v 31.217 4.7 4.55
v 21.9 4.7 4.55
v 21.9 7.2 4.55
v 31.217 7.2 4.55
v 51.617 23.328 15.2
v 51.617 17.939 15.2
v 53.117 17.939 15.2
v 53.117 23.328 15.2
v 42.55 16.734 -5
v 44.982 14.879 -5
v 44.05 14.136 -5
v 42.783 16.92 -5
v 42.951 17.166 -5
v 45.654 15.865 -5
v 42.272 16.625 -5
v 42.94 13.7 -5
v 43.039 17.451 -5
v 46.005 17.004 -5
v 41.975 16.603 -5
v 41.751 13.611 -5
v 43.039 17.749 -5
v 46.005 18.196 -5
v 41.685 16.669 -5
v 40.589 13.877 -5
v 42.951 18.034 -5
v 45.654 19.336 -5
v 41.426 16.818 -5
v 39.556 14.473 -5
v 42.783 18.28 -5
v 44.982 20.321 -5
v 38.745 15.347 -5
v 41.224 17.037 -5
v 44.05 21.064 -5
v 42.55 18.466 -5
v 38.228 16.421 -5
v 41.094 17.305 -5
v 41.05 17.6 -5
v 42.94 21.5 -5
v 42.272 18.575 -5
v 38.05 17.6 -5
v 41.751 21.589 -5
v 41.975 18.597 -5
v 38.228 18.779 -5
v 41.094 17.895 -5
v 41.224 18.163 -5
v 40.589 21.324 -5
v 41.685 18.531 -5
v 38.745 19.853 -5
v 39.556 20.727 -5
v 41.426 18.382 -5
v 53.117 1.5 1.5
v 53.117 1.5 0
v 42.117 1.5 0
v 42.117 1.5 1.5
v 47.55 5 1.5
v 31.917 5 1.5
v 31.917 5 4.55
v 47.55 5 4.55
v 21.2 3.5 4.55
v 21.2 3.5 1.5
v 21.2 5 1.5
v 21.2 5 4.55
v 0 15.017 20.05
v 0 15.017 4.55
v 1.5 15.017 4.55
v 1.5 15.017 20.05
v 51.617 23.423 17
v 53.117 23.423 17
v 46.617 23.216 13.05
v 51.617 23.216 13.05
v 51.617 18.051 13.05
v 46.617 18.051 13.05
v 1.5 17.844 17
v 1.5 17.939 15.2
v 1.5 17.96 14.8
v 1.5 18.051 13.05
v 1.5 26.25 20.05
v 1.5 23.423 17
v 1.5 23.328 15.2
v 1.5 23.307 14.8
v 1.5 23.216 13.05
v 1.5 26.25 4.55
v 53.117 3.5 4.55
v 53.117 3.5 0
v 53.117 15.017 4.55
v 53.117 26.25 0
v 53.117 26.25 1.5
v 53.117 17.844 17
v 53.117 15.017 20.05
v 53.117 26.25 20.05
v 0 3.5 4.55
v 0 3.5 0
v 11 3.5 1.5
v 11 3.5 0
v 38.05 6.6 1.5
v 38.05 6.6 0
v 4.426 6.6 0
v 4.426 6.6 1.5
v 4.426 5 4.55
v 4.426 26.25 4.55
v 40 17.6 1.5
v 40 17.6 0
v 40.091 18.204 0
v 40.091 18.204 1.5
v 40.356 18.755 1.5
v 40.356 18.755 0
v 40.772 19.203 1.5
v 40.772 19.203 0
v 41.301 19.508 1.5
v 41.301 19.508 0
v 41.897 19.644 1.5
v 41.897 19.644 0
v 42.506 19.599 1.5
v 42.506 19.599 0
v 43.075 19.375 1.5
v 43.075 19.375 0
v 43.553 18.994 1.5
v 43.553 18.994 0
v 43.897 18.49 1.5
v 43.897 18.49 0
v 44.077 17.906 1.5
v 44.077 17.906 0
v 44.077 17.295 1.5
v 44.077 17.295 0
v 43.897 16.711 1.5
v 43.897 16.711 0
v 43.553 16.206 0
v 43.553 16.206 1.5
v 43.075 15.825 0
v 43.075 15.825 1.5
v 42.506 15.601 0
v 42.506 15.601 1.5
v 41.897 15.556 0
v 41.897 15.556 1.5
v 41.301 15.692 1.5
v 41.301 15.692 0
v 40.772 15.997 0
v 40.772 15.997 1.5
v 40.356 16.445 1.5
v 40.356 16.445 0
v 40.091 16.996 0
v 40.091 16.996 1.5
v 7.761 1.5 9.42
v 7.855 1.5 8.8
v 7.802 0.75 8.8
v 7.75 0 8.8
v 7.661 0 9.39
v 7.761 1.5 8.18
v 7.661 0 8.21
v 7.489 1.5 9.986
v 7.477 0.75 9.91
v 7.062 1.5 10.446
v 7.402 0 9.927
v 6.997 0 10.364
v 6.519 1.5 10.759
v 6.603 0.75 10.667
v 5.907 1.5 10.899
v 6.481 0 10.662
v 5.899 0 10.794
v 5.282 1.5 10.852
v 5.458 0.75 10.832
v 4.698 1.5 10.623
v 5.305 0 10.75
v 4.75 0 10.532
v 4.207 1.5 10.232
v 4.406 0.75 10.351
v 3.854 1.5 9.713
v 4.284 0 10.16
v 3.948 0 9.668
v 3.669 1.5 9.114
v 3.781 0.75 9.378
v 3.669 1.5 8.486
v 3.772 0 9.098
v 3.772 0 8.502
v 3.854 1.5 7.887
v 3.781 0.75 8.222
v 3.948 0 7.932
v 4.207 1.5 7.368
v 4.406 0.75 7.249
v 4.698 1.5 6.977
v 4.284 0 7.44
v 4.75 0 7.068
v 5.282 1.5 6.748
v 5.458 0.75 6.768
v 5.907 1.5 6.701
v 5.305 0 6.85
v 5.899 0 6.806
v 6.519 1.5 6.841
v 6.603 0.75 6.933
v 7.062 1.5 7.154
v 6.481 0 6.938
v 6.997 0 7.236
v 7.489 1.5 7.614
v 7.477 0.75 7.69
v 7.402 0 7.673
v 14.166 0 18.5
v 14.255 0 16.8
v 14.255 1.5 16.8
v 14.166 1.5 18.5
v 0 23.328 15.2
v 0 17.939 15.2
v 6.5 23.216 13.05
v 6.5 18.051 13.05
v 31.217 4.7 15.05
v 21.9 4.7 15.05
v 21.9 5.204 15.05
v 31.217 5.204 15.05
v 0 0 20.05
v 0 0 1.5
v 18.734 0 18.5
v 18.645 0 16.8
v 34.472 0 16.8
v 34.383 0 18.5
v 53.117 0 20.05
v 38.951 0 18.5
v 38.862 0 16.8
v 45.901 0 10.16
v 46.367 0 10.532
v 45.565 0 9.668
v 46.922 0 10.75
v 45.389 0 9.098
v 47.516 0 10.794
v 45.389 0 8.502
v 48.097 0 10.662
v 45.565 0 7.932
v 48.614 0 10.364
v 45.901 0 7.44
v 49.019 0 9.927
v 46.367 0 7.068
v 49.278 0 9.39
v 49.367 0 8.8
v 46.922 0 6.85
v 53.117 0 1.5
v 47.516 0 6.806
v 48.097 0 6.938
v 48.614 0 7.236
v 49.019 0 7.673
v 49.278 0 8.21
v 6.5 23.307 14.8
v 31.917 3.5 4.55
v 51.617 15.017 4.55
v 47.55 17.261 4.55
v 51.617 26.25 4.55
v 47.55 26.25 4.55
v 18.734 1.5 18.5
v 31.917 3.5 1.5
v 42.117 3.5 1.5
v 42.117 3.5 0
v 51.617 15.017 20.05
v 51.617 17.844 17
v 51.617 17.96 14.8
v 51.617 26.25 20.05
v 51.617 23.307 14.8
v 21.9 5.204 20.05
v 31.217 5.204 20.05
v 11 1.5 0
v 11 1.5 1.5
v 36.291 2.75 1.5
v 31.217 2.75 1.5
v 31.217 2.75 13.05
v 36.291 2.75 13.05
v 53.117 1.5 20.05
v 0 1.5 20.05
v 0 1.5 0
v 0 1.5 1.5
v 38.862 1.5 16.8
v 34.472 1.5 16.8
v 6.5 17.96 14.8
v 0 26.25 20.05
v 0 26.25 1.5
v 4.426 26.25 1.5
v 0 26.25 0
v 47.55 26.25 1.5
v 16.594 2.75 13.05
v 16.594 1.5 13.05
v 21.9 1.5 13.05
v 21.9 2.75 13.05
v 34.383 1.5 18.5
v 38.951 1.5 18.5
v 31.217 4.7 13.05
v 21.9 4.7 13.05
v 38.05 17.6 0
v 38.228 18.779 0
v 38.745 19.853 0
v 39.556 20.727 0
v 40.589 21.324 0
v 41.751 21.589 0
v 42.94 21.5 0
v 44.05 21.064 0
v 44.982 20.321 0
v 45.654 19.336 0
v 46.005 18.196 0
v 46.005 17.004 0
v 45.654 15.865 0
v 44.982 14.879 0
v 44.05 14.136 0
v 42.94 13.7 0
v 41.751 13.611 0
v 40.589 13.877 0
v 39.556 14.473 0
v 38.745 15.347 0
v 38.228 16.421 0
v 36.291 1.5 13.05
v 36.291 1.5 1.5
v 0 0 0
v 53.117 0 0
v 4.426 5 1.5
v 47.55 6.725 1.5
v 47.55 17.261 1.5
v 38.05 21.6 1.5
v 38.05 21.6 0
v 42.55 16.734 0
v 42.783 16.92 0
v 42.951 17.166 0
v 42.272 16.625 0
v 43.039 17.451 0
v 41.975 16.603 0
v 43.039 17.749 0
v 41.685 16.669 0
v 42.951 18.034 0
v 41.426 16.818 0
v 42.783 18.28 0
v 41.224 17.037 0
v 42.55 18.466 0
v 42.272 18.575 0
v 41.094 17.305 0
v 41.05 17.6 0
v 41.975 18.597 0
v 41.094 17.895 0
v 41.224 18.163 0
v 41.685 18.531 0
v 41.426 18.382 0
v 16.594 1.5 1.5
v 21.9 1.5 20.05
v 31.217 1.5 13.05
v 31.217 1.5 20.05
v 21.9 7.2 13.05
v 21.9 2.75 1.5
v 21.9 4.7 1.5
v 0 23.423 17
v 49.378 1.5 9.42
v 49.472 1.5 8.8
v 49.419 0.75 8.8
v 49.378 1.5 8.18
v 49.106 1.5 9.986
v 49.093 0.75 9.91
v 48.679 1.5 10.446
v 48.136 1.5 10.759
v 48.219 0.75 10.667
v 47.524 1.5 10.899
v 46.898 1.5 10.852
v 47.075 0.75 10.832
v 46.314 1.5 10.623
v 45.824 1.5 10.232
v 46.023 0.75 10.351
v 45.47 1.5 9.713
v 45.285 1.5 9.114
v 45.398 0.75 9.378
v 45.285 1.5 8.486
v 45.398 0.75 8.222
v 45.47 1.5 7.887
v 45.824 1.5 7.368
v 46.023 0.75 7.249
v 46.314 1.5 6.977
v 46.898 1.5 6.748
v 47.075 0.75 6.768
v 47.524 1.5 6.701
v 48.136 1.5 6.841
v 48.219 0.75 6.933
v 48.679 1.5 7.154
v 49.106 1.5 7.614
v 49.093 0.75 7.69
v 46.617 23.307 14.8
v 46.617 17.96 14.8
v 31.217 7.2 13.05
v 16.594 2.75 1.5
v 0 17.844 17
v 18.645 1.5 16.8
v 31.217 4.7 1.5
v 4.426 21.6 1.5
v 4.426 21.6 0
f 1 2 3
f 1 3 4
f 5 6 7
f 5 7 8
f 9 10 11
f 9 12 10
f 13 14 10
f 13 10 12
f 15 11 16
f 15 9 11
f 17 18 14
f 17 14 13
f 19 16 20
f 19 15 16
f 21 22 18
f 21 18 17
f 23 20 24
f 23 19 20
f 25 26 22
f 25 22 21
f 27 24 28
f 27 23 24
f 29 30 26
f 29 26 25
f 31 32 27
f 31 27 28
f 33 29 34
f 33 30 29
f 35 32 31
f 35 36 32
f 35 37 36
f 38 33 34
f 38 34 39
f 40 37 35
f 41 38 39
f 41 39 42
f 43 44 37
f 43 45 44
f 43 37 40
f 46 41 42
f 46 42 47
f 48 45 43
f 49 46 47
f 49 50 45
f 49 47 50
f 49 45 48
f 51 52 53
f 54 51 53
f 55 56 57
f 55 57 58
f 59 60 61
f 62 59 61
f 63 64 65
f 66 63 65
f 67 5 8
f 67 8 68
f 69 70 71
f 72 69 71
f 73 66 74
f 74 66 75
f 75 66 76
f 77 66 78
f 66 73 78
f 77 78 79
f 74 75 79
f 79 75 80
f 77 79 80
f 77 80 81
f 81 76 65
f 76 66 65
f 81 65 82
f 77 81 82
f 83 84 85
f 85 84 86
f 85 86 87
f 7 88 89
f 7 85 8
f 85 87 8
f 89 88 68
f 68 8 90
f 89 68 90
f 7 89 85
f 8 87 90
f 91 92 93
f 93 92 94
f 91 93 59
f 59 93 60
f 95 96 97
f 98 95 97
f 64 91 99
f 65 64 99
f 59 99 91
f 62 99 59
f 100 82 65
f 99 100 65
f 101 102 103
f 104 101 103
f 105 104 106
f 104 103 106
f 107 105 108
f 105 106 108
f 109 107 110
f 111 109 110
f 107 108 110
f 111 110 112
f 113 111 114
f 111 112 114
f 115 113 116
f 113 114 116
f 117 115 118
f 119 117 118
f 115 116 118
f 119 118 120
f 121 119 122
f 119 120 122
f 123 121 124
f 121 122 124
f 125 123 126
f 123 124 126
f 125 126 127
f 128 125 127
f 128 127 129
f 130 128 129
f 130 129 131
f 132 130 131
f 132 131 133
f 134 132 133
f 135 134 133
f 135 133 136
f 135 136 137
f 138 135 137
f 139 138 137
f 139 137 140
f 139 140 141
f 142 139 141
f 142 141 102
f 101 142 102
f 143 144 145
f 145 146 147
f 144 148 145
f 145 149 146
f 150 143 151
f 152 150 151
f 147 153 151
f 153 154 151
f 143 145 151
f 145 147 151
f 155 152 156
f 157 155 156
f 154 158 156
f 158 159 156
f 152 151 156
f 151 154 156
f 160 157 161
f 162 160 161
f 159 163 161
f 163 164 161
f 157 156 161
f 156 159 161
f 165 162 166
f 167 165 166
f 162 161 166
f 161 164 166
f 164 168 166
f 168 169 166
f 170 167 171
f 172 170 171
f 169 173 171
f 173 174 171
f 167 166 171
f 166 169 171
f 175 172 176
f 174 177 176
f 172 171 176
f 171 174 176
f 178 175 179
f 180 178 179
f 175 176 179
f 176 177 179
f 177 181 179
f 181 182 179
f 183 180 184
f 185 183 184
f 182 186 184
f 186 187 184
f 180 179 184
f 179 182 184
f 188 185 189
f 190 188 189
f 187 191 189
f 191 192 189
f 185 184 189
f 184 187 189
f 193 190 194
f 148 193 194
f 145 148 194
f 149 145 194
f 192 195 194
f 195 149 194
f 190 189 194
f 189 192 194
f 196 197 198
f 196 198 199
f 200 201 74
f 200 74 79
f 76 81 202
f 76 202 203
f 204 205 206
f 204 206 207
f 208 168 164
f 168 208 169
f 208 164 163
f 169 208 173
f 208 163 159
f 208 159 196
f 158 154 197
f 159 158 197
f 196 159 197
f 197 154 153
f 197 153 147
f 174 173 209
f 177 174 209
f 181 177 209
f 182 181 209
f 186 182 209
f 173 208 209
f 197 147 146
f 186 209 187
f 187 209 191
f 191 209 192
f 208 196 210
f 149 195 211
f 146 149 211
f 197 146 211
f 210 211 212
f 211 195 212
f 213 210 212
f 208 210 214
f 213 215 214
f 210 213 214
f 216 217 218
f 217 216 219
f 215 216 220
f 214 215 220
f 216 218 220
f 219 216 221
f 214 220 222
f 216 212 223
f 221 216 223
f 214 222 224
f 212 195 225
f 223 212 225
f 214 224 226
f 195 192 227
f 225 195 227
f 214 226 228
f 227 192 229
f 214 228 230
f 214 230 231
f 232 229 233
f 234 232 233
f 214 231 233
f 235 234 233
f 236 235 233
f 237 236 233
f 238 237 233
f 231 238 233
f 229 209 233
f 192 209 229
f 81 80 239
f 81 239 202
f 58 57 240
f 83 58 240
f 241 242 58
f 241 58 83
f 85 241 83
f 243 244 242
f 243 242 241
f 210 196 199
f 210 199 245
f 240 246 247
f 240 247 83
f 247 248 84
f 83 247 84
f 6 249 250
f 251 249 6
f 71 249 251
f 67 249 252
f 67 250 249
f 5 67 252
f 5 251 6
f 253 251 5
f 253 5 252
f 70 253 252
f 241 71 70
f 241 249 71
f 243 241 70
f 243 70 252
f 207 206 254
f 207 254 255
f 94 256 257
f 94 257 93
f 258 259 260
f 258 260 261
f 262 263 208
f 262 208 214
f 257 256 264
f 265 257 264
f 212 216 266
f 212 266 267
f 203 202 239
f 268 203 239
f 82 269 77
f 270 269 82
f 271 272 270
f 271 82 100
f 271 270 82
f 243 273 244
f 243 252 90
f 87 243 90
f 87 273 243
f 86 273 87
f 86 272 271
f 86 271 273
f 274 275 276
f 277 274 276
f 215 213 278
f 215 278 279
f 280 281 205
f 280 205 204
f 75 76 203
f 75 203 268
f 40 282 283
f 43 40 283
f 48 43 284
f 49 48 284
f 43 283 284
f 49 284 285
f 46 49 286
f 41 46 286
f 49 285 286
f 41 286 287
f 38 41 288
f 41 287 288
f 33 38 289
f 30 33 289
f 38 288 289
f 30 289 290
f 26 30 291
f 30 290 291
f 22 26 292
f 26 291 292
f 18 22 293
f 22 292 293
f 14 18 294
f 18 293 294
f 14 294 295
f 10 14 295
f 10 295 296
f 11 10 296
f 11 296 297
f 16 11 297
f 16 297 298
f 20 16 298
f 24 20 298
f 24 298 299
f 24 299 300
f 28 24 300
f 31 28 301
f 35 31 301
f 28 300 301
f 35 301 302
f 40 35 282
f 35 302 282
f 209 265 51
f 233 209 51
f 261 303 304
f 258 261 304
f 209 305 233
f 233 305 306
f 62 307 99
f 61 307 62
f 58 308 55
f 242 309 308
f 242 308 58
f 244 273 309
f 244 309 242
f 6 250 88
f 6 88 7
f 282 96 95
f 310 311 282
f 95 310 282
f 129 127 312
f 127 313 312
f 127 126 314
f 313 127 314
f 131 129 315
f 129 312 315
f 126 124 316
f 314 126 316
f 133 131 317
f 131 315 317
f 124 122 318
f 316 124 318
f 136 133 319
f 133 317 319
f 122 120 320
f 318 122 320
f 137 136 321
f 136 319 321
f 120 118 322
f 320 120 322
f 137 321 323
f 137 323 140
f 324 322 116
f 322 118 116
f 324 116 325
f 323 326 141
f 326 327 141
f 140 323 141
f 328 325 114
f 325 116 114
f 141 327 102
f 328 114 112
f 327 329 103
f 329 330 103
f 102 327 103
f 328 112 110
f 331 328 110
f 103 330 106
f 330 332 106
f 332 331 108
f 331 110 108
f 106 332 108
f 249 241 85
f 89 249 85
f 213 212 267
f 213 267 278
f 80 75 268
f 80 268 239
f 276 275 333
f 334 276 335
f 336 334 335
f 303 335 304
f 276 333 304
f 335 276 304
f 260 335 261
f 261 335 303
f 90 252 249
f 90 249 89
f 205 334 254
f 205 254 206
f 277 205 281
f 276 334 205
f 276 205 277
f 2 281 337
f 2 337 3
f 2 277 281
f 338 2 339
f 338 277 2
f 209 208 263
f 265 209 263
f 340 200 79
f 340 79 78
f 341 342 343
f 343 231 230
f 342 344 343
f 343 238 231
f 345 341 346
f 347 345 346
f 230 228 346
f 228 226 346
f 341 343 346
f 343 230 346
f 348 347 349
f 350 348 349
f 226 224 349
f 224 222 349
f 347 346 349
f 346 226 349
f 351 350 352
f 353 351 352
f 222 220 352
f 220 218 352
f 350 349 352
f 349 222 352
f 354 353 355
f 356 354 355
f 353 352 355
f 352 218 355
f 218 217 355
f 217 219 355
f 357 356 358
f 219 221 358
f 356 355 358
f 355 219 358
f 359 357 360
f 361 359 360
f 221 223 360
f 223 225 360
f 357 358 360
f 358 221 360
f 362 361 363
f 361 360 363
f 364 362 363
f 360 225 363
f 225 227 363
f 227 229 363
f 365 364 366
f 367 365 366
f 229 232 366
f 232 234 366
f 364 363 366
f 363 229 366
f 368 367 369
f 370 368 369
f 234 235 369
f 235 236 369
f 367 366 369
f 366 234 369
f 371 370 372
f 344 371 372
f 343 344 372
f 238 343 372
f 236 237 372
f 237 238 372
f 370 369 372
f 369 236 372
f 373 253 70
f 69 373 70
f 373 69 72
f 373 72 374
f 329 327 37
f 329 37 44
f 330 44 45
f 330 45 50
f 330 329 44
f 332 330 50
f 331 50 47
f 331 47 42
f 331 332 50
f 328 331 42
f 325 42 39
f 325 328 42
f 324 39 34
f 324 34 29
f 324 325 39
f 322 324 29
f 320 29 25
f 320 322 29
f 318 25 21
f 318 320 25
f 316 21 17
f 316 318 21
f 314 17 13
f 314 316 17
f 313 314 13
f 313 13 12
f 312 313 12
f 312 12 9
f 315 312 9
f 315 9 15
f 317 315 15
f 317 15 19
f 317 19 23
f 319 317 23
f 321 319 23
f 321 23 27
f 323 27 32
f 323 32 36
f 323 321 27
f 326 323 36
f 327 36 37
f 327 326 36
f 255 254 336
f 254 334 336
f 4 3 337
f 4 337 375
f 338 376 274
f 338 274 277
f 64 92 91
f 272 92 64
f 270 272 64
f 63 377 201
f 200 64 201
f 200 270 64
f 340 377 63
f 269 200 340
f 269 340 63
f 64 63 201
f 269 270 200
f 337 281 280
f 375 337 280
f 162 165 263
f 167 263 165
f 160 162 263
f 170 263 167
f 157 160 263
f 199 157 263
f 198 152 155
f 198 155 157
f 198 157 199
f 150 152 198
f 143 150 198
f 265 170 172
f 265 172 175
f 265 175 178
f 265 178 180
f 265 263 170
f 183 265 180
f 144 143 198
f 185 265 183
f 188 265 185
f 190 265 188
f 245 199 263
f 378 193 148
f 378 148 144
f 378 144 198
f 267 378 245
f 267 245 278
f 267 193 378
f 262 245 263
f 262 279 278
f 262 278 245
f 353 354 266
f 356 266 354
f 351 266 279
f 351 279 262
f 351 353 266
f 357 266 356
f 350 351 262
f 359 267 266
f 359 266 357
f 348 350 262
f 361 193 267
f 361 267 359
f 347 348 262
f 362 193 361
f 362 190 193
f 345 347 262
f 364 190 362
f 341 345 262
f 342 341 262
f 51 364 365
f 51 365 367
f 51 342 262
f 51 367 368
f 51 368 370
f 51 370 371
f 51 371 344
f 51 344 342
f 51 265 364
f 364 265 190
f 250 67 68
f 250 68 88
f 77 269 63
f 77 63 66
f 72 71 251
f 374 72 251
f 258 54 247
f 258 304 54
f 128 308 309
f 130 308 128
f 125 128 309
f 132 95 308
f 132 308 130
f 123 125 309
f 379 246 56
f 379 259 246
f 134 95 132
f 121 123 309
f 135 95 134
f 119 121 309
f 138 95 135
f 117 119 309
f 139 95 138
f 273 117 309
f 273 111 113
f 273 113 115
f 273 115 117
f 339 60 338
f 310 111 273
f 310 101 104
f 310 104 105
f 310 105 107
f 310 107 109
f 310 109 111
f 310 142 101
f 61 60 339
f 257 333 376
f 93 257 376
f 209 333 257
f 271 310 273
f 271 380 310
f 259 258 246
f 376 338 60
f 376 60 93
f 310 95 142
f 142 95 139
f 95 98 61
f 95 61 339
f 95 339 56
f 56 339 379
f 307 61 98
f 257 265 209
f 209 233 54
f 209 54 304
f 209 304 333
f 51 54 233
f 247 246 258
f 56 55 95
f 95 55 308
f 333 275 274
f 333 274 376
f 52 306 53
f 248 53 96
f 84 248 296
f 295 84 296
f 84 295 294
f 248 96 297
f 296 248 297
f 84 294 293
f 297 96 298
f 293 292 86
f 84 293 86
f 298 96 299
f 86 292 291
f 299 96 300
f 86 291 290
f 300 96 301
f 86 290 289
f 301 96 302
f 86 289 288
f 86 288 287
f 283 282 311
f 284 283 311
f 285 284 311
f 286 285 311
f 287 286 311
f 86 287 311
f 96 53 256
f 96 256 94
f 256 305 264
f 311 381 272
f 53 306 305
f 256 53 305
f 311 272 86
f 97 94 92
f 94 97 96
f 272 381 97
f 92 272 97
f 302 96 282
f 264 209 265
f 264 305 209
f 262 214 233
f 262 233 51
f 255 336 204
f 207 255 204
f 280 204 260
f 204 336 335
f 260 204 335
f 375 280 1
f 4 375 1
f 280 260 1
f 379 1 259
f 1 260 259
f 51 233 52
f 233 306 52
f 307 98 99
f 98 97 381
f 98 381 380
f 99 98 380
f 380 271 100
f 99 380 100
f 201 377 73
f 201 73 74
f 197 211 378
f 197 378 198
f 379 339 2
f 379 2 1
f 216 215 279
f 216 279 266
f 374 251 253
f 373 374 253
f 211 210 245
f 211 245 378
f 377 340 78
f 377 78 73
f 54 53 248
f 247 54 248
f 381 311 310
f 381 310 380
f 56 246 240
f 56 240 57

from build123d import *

# Parameters (mm, degrees)
SKETCH1_W                              = 53.116817528
SKETCH1_H                              = 26.25
FRONT_SIDE_MAIN_DEPTH                  = 1.5
RESET_HOLE_DEPTH                       = 3.75
SKETCH15_W                             = 3.966010581
SKETCH15_H                             = 2.112155191
SKETCH15_W_2                           = 3.557190409
SKETCH15_H_2                           = 2.236587576
SKETCH15_W_3                           = 3.981127105
SKETCH15_H_3                           = 2.476855865
COMPONENT_HOLES_DEPTH                  = 3.75
SKETCH16_W                             = 10.85
SKETCH16_H                             = 14.75
MICROPHONE_HOLE_DEPTH                  = 1.5
SKETCH24_W                             = 1.5
SKETCH24_H                             = 11.233042059
RIGHT_SIDE_TOP_DEPTH                   = 18.55
SNAP_GROOVE_RIGHT_DEPTH                = 1.5
SKETCH26_W                             = 1.5
SKETCH26_H                             = 11.233042059
LEFT_SIDE_TOP_DEPTH                    = 18.55
SNAP_START                             = 51.616817528
SNAP_GROOVE_LEFT_DEPTH                 = 1.5
SKETCH20_W                             = 53.116817528
SKETCH20_H                             = 1.5
BOTTOM_BASE_DEPTH                      = 18.55
SERVO_START                            = -1.5
SKETCH18_W                             = 9.316817528
SKETCH18_H                             = 3.2
SERVO_SEPERATOR_BOTTOM_DEPTH           = 20.05
SKETCH34_W                             = 2.537171882
SKETCH34_H                             = 15
PROGRAMMING_HOLE_DEPTH                 = 3.75
SKETCH38_W                             = 9.316817528
SKETCH38_H                             = 5
BACK_BATTERY_HOLDER_BOTTOM_DEPTH       = 0.504457941
SKETCH40_R                             = 2
SERVO_ARM_HOLES_BOTTOM_DEPTH           = 1.5
SERVO_ARM_HOLES_BOTTOM_DRAFT           = 4
SERVO_ARM_HOLES_BOTTOM_PROFILE_2_DEPTH = 1.5
SERVO_ARM_HOLES_BOTTOM_PROFILE_2_DRAFT = 4
SKETCH47_W                             = 11
SKETCH47_H                             = 2
SOLAR_ARM_HOLES_FRONT_DEPTH            = 1.5
SKETCH48_W                             = 9.316817528
SKETCH48_H                             = 8.5
SERVO_TALLER_SEPERATOR_BOTTOM_DEPTH    = 2.5
SKETCH51_W                             = 5.074553148
SKETCH51_H                             = 11.55
SKETCH51_W_2                           = 5.306259021
SERVO_LIFTERS_BOTTOM_DEPTH             = 1.25
SKETCH52_W                             = 21.2
SKETCH52_H                             = 1.5
SERVO_UNDER_SUPPORT_DEPTH              = 3.05
SKETCH49_W                             = 1.573389805
SKETCH49_H                             = 10.535992885
SERVO_2_CASE_SPACER_FRONT_DEPTH        = 3.05
SERVO_TOP_SUPPORT_RIGHT_DEPTH          = 5
SERVO_TOP_SUPPORT_LEFT_DEPTH           = 5
SNAP_GROOVE_BOTTOM_RIGHT_DEPTH         = 1.5
SNAP_GROOVE_BOTTOM_LEFT_DEPTH          = 1.5
SKETCH56_W                             = 32.587188542
SKETCH56_H                             = 15
CUT_EXTRUDE1_DEPTH                     = 1.5
SKETCH57_W                             = 8.5
SKETCH57_H                             = 1.5
BOSS_EXTRUDE1_DEPTH                    = 14.75
SKETCH58_R                             = 2.05
CUT_EXTRUDE2_DEPTH                     = 10
SKETCH59_W                             = 1.5
SKETCH59_H                             = 15
BOSS_EXTRUDE2_DEPTH                    = 1.5
SKETCH60_W                             = 2.925575138
SKETCH60_H                             = 19.525
BOSS_EXTRUDE3_DEPTH                    = 3.05
SKETCH62_W                             = 3.05
SKETCH62_H                             = 10.535992885
BOSS_EXTRUDE4_DEPTH                    = 3.993492161
SKETCH63_W                             = 4.066881966
SKETCH63_H                             = 3.05
BOSS_EXTRUDE5_DEPTH                    = 8.989007115
SKETCH64_W                             = 3.05
SKETCH64_H                             = 8.291957941
BOSS_EXTRUDE6_DEPTH                    = 1.5
BOSS_EXTRUDE7_REACH                    = 62.039
SKETCH65_W                             = 4.425575138
SKETCH65_H                             = 3.05
BOSS_EXTRUDE8_REACH                    = 62.039
SKETCH66_W                             = 5.566881966
SKETCH66_H                             = 3.05
SKETCH67_R                             = 4
SKETCH67_R_2                           = 1
BOSS_EXTRUDE9_DEPTH                    = 5


# Read off the part's stored shape, not the designer's step: Snap Groove - Right, Snap Groove - Left, Snap Groove - Bottom Right, Snap Groove - Bottom Left
with BuildPart() as part:
    # Sketch1 → Front Side - Main (new body)
    with BuildSketch(Plane.XY):
        with Locations((26.558408764, 13.125)):
            Rectangle(SKETCH1_W, SKETCH1_H)
    extrude(amount=FRONT_SIDE_MAIN_DEPTH)

    # Reset Hole Sketch → Reset Hole (cut)
    with BuildSketch(Plane(origin=(0, 0, 3.75), x_dir=(-1, 0, 0), z_dir=(0, 0, -1))):
        Polygon((-31.190735744, 17.626168756), (-34.141748042, 17.658585925), (-36.251351249, 15.594827519), (-36.283768419, 12.643815222), (-34.220010013, 10.534212015), (-31.268997715, 10.501794845), (-29.159394508, 12.565553251), (-29.126977338, 15.516565548), align=None)
    extrude(amount=RESET_HOLE_DEPTH, mode=Mode.SUBTRACT)

    # Sketch15 → Component Holes (cut)
    with BuildSketch(Plane(origin=(0, 0, 3.75), x_dir=(-1, 0, 0), z_dir=(0, 0, -1))):
        Polygon((-21.737702993, 20.027277789), (-15.857179586, 14.146754382), (-21.737702993, 8.266230975), (-27.6182264, 14.146754382), align=None)
        with Locations((-11.649935563, 9.695513201)):
            Rectangle(SKETCH15_W, SKETCH15_H)
        with Locations((-11.599935563, 14.270513201)):
            Rectangle(SKETCH15_W_2, SKETCH15_H_2)
        with Locations((-9.949935563, 18.095513201)):
            Rectangle(SKETCH15_W_3, SKETCH15_H_3)
    extrude(amount=COMPONENT_HOLES_DEPTH, mode=Mode.SUBTRACT)

    # Sketch16 → Microphone Hole (cut)
    with BuildSketch(Plane(origin=(0, 0, 0), x_dir=(-1, 0, 0), z_dir=(0, 0, -1))):
        with Locations((-41.124935562, 14.1)):
            Rectangle(SKETCH16_W, SKETCH16_H)
    extrude(amount=-MICROPHONE_HOLE_DEPTH, mode=Mode.SUBTRACT)

    # Sketch24 → Right Side - Top (add)
    with BuildSketch(Plane.XY.offset(1.5)):
        with Locations((0.75, 20.633478971)):
            Rectangle(SKETCH24_W, SKETCH24_H)
    extrude(amount=RIGHT_SIDE_TOP_DEPTH)

    # Snap Groove - Right outline → Snap Groove - Right (cut)
    with BuildSketch(Plane.YZ):
        Polygon((17.938719748, 15.2), (23.328238192, 15.2), (23.422572195, 17), (17.844385746, 17), align=None)
    extrude(amount=SNAP_GROOVE_RIGHT_DEPTH, mode=Mode.SUBTRACT)

    # Sketch26 → Left Side - Top (add)
    with BuildSketch(Plane.XY.offset(1.5)):
        with Locations((52.366817528, 20.633478971)):
            Rectangle(SKETCH26_W, SKETCH26_H)
    extrude(amount=LEFT_SIDE_TOP_DEPTH)

    # Snap Groove - Left outline → Snap Groove - Left (cut)
    with BuildSketch(Plane.YZ.offset(SNAP_START)):
        Polygon((17.938719748, 15.2), (23.328238192, 15.2), (23.422572195, 17), (17.844385746, 17), align=None)
    extrude(amount=SNAP_GROOVE_LEFT_DEPTH, mode=Mode.SUBTRACT)

    # Sketch18 → Servo Seperator - Bottom (add)
    with BuildSketch(Plane.XY.offset(1.5).offset(SERVO_START)):
        with Locations((26.558408764, 3.1)):
            Rectangle(SKETCH18_W, SKETCH18_H)
    extrude(amount=SERVO_SEPERATOR_BOTTOM_DEPTH)

    # Sketch34 → Programming Hole (cut)
    with BuildSketch(Plane(origin=(0, 0, 0), x_dir=(-1, 0, 0), z_dir=(0, 0, -1))):
        with Locations((-4.194161079, 14.100049249)):
            Rectangle(SKETCH34_W, SKETCH34_H)
    extrude(amount=-PROGRAMMING_HOLE_DEPTH, mode=Mode.SUBTRACT)

    # Sketch38 → Back Battery Holder - Bottom (add)
    with BuildSketch(Plane(origin=(0, 4.7, 0), x_dir=(1, 0, 0), z_dir=(0, 1, 0))):
        with Locations((26.558408764, -17.55)):
            Rectangle(SKETCH38_W, SKETCH38_H)
    extrude(amount=BACK_BATTERY_HOLDER_BOTTOM_DEPTH)

    # Sketch47 → Solar Arm Holes - Front (cut)
    with BuildSketch(Plane(origin=(0, 0, 0), x_dir=(-1, 0, 0), z_dir=(0, 0, -1))):
        with Locations((-47.616817528, 2.5)):
            Rectangle(SKETCH47_W, SKETCH47_H)
        with Locations((-5.5, 2.5)):
            Rectangle(SKETCH47_W, SKETCH47_H)
    extrude(amount=-SOLAR_ARM_HOLES_FRONT_DEPTH, mode=Mode.SUBTRACT)

    # Sketch48 → Servo Taller Seperator - Bottom (add)
    with BuildSketch(Plane(origin=(0, 4.7, 0), x_dir=(1, 0, 0), z_dir=(0, 1, 0))):
        with Locations((26.558408764, -8.8)):
            Rectangle(SKETCH48_W, SKETCH48_H)
    extrude(amount=SERVO_TALLER_SEPERATOR_BOTTOM_DEPTH)

    # Sketch51 → Servo Lifters - Bottom (add)
    with BuildSketch(Plane(origin=(0, 1.5, 0), x_dir=(1, 0, 0), z_dir=(0, 1, 0))):
        with Locations((33.754094102, -7.275)):
            Rectangle(SKETCH51_W, SKETCH51_H)
        with Locations((19.24687049, -7.275)):
            Rectangle(SKETCH51_W_2, SKETCH51_H)
    extrude(amount=SERVO_LIFTERS_BOTTOM_DEPTH)

    # Sketch52 → Servo Under Support (add)
    with BuildSketch(Plane.XY.offset(1.5)):
        with Locations((10.6, 4.25)):
            Rectangle(SKETCH52_W, SKETCH52_H)
        with Locations((42.516817528, 4.25)):
            Rectangle(SKETCH52_W, SKETCH52_H)
    extrude(amount=SERVO_UNDER_SUPPORT_DEPTH)

    # Sketch49 → Servo 2 Case Spacer - Front (add)
    with BuildSketch(Plane.XY.offset(1.5)):
        with Locations((48.336630465, 11.992996443)):
            Rectangle(SKETCH49_W, SKETCH49_H)
    extrude(amount=SERVO_2_CASE_SPACER_FRONT_DEPTH)

    # Sketch53 → Servo Top Support - Right (add)
    with BuildSketch(Plane(origin=(1.5, 0, 0), x_dir=(0, 0, -1), z_dir=(1, 0, 0))):
        Polygon((-14.8, 23.307275081), (-13.05, 23.215561467), (-13.05, 18.051396474), (-14.8, 17.95968286), align=None)
    extrude(amount=SERVO_TOP_SUPPORT_RIGHT_DEPTH)

    # Sketch55 → Servo Top Support - Left (add)
    with BuildSketch(Plane.ZY.offset(-51.616817528)):
        Polygon((14.8, 17.95968286), (14.8, 23.307275081), (13.05, 23.215561467), (13.05, 18.051396474), align=None)
    extrude(amount=SERVO_TOP_SUPPORT_LEFT_DEPTH)

    # Sketch56 → Cut-Extrude1 (cut)
    with BuildSketch(Plane(origin=(0, 0, 0), x_dir=(-1, 0, 0), z_dir=(0, 0, -1))):
        with Locations((-21.756341291, 14.100049249)):
            Rectangle(SKETCH56_W, SKETCH56_H)
    extrude(amount=-CUT_EXTRUDE1_DEPTH, mode=Mode.SUBTRACT)

    # Sketch57 → Boss-Extrude1 (add)
    with BuildSketch(Plane.XZ.offset(-21.475)):
        with Locations((42.299935562, 0.75)):
            Rectangle(SKETCH57_W, SKETCH57_H)
    extrude(amount=BOSS_EXTRUDE1_DEPTH)

    # Sketch58 → Cut-Extrude2 (cut)
    with BuildSketch(Plane(origin=(0, 0, 0), x_dir=(-1, 0, 0), z_dir=(0, 0, -1))):
        with Locations((-42.049935562, 17.600049249)):
            Circle(SKETCH58_R)
    extrude(amount=-CUT_EXTRUDE2_DEPTH, mode=Mode.SUBTRACT)

    # Sketch59 → Boss-Extrude2 (add)
    with BuildSketch(Plane(origin=(2.925575138, 0, 0), x_dir=(0, 0, -1), z_dir=(1, 0, 0))):
        with Locations((-0.75, 14.100049249)):
            Rectangle(SKETCH59_W, SKETCH59_H)
    extrude(amount=BOSS_EXTRUDE2_DEPTH)

    # Sketch60 → Boss-Extrude3 (add)
    with BuildSketch(Plane.XY.offset(1.5)):
        with Locations((2.962787569, 16.4875)):
            Rectangle(SKETCH60_W, SKETCH60_H)
    extrude(amount=BOSS_EXTRUDE3_DEPTH)

    # Sketch62 → Boss-Extrude4 (add)
    with BuildSketch(Plane(origin=(49.123325367, 0, 0), x_dir=(0, 0, -1), z_dir=(1, 0, 0))):
        with Locations((-3.025, 11.992996443)):
            Rectangle(SKETCH62_W, SKETCH62_H)
    extrude(amount=BOSS_EXTRUDE4_DEPTH)

    # Sketch63 → Boss-Extrude5 (add)
    with BuildSketch(Plane(origin=(0, 17.260992885, 0), x_dir=(1, 0, 0), z_dir=(0, 1, 0))):
        with Locations((49.583376545, -3.025)):
            Rectangle(SKETCH63_W, SKETCH63_H)
    extrude(amount=BOSS_EXTRUDE5_DEPTH)

    # Sketch64 → Boss-Extrude6 (add)
    with BuildSketch(Plane.ZY.offset(-1.5)):
        with Locations((3.025, 10.870978971)):
            Rectangle(SKETCH64_W, SKETCH64_H)
    extrude(amount=BOSS_EXTRUDE6_DEPTH)

    # Sketch65 → Boss-Extrude7 (add, up to next)
    with BuildSketch(Plane.XZ.offset(-6.725), mode=Mode.PRIVATE) as boss_extrude7_sk1:
        with Locations((2.212787569, 3.025)):
            Rectangle(SKETCH65_W, SKETCH65_H)
    boss_extrude7_tool1 = extrude(boss_extrude7_sk1.sketch, amount=BOSS_EXTRUDE7_REACH, mode=Mode.PRIVATE) - part.part
    add(boss_extrude7_tool1.solids().sort_by_distance((2.212788, 6.725, 3.025))[0])

    # Sketch66 → Boss-Extrude8 (add, up to next)
    with BuildSketch(Plane.XZ.offset(-6.725), mode=Mode.PRIVATE) as boss_extrude8_sk1:
        with Locations((50.333376545, 3.025)):
            Rectangle(SKETCH66_W, SKETCH66_H)
    boss_extrude8_tool1 = extrude(boss_extrude8_sk1.sketch, amount=BOSS_EXTRUDE8_REACH, mode=Mode.PRIVATE) - part.part
    add(boss_extrude8_tool1.solids().sort_by_distance((50.333377, 6.725, 3.025))[0])

    # Sketch67 → Boss-Extrude9 (add)
    with BuildSketch(Plane(origin=(0, 0, 0), x_dir=(-1, 0, 0), z_dir=(0, 0, -1))):
        with Locations((-42.049935562, 17.600049249)):
            Circle(SKETCH67_R)
        with Locations((-42.049935562, 17.600049249)):
            Circle(SKETCH67_R_2, mode=Mode.SUBTRACT)
    extrude(amount=BOSS_EXTRUDE9_DEPTH)


with BuildPart() as body_2:
    # Sketch20 → Bottom Base (new body)
    with BuildSketch(Plane.XY.offset(1.5)):
        with Locations((26.558408764, 0.75)):
            Rectangle(SKETCH20_W, SKETCH20_H)
    extrude(amount=BOTTOM_BASE_DEPTH)


with BuildPart() as servo_arm_holes_bottom_tool:
    # Sketch40 → Servo arm Holes - Bottom (with draft: the straight prism first)
    with BuildSketch(Plane.XZ):
        with Locations((47.366817528, 8.8)):
            Circle(SKETCH40_R)
    extrude(amount=-SERVO_ARM_HOLES_BOTTOM_DEPTH)
    # Servo arm Holes - Bottom: the draft: its side faces are tilted about the plane it starts from
    servo_arm_holes_bottom_sides = [servo_arm_holes_bottom_tool.faces().sort_by_distance(p)[0] for p in [
        (45.366817528, 0.75, 8.8),
    ]]
    draft(servo_arm_holes_bottom_sides, Plane.XZ, SERVO_ARM_HOLES_BOTTOM_DRAFT)


with BuildPart() as body_2_1:
    add(body_2.part)

    # Servo arm Holes - Bottom: cut by servo_arm_holes_bottom_tool
    add(servo_arm_holes_bottom_tool.part, mode=Mode.SUBTRACT)


with BuildPart() as servo_arm_holes_bottom_profile_2_tool:
    # Sketch40 → Servo arm Holes - Bottom profile 2 (with draft: the straight prism first)
    with BuildSketch(Plane.XZ):
        with Locations((5.75, 8.8)):
            Circle(SKETCH40_R)
    extrude(amount=-SERVO_ARM_HOLES_BOTTOM_PROFILE_2_DEPTH)
    # Servo arm Holes - Bottom profile 2: the draft: its side faces are tilted about the plane it starts from
    servo_arm_holes_bottom_profile_2_sides = [servo_arm_holes_bottom_profile_2_tool.faces().sort_by_distance(p)[0] for p in [
        (3.75, 0.75, 8.8),
    ]]
    draft(servo_arm_holes_bottom_profile_2_sides, Plane.XZ, SERVO_ARM_HOLES_BOTTOM_PROFILE_2_DRAFT)


with BuildPart() as body_2_2:
    add(body_2_1.part)

    # Servo arm Holes - Bottom profile 2: cut by servo_arm_holes_bottom_profile_2_tool
    add(servo_arm_holes_bottom_profile_2_tool.part, mode=Mode.SUBTRACT)

    # Snap Groove - Bottom Right outline → Snap Groove - Bottom Right (cut)
    with BuildSketch(Plane(origin=(0, 0, 0), x_dir=(1, 0, 0), z_dir=(0, 1, 0))):
        Polygon((14.166147553, -18.5), (18.733852447, -18.5), (18.644759222, -16.8), (14.255240778, -16.8), align=None)
    extrude(amount=SNAP_GROOVE_BOTTOM_RIGHT_DEPTH, mode=Mode.SUBTRACT)

    # Snap Groove - Bottom Left outline → Snap Groove - Bottom Left (cut)
    with BuildSketch(Plane(origin=(0, 0, 0), x_dir=(1, 0, 0), z_dir=(0, 1, 0))):
        Polygon((38.950669975, -18.5), (38.86157675, -16.8), (34.472058306, -16.8), (34.382965081, -18.5), align=None)
    extrude(amount=SNAP_GROOVE_BOTTOM_LEFT_DEPTH, mode=Mode.SUBTRACT)


solid = Compound([part.part, body_2_2.part])
